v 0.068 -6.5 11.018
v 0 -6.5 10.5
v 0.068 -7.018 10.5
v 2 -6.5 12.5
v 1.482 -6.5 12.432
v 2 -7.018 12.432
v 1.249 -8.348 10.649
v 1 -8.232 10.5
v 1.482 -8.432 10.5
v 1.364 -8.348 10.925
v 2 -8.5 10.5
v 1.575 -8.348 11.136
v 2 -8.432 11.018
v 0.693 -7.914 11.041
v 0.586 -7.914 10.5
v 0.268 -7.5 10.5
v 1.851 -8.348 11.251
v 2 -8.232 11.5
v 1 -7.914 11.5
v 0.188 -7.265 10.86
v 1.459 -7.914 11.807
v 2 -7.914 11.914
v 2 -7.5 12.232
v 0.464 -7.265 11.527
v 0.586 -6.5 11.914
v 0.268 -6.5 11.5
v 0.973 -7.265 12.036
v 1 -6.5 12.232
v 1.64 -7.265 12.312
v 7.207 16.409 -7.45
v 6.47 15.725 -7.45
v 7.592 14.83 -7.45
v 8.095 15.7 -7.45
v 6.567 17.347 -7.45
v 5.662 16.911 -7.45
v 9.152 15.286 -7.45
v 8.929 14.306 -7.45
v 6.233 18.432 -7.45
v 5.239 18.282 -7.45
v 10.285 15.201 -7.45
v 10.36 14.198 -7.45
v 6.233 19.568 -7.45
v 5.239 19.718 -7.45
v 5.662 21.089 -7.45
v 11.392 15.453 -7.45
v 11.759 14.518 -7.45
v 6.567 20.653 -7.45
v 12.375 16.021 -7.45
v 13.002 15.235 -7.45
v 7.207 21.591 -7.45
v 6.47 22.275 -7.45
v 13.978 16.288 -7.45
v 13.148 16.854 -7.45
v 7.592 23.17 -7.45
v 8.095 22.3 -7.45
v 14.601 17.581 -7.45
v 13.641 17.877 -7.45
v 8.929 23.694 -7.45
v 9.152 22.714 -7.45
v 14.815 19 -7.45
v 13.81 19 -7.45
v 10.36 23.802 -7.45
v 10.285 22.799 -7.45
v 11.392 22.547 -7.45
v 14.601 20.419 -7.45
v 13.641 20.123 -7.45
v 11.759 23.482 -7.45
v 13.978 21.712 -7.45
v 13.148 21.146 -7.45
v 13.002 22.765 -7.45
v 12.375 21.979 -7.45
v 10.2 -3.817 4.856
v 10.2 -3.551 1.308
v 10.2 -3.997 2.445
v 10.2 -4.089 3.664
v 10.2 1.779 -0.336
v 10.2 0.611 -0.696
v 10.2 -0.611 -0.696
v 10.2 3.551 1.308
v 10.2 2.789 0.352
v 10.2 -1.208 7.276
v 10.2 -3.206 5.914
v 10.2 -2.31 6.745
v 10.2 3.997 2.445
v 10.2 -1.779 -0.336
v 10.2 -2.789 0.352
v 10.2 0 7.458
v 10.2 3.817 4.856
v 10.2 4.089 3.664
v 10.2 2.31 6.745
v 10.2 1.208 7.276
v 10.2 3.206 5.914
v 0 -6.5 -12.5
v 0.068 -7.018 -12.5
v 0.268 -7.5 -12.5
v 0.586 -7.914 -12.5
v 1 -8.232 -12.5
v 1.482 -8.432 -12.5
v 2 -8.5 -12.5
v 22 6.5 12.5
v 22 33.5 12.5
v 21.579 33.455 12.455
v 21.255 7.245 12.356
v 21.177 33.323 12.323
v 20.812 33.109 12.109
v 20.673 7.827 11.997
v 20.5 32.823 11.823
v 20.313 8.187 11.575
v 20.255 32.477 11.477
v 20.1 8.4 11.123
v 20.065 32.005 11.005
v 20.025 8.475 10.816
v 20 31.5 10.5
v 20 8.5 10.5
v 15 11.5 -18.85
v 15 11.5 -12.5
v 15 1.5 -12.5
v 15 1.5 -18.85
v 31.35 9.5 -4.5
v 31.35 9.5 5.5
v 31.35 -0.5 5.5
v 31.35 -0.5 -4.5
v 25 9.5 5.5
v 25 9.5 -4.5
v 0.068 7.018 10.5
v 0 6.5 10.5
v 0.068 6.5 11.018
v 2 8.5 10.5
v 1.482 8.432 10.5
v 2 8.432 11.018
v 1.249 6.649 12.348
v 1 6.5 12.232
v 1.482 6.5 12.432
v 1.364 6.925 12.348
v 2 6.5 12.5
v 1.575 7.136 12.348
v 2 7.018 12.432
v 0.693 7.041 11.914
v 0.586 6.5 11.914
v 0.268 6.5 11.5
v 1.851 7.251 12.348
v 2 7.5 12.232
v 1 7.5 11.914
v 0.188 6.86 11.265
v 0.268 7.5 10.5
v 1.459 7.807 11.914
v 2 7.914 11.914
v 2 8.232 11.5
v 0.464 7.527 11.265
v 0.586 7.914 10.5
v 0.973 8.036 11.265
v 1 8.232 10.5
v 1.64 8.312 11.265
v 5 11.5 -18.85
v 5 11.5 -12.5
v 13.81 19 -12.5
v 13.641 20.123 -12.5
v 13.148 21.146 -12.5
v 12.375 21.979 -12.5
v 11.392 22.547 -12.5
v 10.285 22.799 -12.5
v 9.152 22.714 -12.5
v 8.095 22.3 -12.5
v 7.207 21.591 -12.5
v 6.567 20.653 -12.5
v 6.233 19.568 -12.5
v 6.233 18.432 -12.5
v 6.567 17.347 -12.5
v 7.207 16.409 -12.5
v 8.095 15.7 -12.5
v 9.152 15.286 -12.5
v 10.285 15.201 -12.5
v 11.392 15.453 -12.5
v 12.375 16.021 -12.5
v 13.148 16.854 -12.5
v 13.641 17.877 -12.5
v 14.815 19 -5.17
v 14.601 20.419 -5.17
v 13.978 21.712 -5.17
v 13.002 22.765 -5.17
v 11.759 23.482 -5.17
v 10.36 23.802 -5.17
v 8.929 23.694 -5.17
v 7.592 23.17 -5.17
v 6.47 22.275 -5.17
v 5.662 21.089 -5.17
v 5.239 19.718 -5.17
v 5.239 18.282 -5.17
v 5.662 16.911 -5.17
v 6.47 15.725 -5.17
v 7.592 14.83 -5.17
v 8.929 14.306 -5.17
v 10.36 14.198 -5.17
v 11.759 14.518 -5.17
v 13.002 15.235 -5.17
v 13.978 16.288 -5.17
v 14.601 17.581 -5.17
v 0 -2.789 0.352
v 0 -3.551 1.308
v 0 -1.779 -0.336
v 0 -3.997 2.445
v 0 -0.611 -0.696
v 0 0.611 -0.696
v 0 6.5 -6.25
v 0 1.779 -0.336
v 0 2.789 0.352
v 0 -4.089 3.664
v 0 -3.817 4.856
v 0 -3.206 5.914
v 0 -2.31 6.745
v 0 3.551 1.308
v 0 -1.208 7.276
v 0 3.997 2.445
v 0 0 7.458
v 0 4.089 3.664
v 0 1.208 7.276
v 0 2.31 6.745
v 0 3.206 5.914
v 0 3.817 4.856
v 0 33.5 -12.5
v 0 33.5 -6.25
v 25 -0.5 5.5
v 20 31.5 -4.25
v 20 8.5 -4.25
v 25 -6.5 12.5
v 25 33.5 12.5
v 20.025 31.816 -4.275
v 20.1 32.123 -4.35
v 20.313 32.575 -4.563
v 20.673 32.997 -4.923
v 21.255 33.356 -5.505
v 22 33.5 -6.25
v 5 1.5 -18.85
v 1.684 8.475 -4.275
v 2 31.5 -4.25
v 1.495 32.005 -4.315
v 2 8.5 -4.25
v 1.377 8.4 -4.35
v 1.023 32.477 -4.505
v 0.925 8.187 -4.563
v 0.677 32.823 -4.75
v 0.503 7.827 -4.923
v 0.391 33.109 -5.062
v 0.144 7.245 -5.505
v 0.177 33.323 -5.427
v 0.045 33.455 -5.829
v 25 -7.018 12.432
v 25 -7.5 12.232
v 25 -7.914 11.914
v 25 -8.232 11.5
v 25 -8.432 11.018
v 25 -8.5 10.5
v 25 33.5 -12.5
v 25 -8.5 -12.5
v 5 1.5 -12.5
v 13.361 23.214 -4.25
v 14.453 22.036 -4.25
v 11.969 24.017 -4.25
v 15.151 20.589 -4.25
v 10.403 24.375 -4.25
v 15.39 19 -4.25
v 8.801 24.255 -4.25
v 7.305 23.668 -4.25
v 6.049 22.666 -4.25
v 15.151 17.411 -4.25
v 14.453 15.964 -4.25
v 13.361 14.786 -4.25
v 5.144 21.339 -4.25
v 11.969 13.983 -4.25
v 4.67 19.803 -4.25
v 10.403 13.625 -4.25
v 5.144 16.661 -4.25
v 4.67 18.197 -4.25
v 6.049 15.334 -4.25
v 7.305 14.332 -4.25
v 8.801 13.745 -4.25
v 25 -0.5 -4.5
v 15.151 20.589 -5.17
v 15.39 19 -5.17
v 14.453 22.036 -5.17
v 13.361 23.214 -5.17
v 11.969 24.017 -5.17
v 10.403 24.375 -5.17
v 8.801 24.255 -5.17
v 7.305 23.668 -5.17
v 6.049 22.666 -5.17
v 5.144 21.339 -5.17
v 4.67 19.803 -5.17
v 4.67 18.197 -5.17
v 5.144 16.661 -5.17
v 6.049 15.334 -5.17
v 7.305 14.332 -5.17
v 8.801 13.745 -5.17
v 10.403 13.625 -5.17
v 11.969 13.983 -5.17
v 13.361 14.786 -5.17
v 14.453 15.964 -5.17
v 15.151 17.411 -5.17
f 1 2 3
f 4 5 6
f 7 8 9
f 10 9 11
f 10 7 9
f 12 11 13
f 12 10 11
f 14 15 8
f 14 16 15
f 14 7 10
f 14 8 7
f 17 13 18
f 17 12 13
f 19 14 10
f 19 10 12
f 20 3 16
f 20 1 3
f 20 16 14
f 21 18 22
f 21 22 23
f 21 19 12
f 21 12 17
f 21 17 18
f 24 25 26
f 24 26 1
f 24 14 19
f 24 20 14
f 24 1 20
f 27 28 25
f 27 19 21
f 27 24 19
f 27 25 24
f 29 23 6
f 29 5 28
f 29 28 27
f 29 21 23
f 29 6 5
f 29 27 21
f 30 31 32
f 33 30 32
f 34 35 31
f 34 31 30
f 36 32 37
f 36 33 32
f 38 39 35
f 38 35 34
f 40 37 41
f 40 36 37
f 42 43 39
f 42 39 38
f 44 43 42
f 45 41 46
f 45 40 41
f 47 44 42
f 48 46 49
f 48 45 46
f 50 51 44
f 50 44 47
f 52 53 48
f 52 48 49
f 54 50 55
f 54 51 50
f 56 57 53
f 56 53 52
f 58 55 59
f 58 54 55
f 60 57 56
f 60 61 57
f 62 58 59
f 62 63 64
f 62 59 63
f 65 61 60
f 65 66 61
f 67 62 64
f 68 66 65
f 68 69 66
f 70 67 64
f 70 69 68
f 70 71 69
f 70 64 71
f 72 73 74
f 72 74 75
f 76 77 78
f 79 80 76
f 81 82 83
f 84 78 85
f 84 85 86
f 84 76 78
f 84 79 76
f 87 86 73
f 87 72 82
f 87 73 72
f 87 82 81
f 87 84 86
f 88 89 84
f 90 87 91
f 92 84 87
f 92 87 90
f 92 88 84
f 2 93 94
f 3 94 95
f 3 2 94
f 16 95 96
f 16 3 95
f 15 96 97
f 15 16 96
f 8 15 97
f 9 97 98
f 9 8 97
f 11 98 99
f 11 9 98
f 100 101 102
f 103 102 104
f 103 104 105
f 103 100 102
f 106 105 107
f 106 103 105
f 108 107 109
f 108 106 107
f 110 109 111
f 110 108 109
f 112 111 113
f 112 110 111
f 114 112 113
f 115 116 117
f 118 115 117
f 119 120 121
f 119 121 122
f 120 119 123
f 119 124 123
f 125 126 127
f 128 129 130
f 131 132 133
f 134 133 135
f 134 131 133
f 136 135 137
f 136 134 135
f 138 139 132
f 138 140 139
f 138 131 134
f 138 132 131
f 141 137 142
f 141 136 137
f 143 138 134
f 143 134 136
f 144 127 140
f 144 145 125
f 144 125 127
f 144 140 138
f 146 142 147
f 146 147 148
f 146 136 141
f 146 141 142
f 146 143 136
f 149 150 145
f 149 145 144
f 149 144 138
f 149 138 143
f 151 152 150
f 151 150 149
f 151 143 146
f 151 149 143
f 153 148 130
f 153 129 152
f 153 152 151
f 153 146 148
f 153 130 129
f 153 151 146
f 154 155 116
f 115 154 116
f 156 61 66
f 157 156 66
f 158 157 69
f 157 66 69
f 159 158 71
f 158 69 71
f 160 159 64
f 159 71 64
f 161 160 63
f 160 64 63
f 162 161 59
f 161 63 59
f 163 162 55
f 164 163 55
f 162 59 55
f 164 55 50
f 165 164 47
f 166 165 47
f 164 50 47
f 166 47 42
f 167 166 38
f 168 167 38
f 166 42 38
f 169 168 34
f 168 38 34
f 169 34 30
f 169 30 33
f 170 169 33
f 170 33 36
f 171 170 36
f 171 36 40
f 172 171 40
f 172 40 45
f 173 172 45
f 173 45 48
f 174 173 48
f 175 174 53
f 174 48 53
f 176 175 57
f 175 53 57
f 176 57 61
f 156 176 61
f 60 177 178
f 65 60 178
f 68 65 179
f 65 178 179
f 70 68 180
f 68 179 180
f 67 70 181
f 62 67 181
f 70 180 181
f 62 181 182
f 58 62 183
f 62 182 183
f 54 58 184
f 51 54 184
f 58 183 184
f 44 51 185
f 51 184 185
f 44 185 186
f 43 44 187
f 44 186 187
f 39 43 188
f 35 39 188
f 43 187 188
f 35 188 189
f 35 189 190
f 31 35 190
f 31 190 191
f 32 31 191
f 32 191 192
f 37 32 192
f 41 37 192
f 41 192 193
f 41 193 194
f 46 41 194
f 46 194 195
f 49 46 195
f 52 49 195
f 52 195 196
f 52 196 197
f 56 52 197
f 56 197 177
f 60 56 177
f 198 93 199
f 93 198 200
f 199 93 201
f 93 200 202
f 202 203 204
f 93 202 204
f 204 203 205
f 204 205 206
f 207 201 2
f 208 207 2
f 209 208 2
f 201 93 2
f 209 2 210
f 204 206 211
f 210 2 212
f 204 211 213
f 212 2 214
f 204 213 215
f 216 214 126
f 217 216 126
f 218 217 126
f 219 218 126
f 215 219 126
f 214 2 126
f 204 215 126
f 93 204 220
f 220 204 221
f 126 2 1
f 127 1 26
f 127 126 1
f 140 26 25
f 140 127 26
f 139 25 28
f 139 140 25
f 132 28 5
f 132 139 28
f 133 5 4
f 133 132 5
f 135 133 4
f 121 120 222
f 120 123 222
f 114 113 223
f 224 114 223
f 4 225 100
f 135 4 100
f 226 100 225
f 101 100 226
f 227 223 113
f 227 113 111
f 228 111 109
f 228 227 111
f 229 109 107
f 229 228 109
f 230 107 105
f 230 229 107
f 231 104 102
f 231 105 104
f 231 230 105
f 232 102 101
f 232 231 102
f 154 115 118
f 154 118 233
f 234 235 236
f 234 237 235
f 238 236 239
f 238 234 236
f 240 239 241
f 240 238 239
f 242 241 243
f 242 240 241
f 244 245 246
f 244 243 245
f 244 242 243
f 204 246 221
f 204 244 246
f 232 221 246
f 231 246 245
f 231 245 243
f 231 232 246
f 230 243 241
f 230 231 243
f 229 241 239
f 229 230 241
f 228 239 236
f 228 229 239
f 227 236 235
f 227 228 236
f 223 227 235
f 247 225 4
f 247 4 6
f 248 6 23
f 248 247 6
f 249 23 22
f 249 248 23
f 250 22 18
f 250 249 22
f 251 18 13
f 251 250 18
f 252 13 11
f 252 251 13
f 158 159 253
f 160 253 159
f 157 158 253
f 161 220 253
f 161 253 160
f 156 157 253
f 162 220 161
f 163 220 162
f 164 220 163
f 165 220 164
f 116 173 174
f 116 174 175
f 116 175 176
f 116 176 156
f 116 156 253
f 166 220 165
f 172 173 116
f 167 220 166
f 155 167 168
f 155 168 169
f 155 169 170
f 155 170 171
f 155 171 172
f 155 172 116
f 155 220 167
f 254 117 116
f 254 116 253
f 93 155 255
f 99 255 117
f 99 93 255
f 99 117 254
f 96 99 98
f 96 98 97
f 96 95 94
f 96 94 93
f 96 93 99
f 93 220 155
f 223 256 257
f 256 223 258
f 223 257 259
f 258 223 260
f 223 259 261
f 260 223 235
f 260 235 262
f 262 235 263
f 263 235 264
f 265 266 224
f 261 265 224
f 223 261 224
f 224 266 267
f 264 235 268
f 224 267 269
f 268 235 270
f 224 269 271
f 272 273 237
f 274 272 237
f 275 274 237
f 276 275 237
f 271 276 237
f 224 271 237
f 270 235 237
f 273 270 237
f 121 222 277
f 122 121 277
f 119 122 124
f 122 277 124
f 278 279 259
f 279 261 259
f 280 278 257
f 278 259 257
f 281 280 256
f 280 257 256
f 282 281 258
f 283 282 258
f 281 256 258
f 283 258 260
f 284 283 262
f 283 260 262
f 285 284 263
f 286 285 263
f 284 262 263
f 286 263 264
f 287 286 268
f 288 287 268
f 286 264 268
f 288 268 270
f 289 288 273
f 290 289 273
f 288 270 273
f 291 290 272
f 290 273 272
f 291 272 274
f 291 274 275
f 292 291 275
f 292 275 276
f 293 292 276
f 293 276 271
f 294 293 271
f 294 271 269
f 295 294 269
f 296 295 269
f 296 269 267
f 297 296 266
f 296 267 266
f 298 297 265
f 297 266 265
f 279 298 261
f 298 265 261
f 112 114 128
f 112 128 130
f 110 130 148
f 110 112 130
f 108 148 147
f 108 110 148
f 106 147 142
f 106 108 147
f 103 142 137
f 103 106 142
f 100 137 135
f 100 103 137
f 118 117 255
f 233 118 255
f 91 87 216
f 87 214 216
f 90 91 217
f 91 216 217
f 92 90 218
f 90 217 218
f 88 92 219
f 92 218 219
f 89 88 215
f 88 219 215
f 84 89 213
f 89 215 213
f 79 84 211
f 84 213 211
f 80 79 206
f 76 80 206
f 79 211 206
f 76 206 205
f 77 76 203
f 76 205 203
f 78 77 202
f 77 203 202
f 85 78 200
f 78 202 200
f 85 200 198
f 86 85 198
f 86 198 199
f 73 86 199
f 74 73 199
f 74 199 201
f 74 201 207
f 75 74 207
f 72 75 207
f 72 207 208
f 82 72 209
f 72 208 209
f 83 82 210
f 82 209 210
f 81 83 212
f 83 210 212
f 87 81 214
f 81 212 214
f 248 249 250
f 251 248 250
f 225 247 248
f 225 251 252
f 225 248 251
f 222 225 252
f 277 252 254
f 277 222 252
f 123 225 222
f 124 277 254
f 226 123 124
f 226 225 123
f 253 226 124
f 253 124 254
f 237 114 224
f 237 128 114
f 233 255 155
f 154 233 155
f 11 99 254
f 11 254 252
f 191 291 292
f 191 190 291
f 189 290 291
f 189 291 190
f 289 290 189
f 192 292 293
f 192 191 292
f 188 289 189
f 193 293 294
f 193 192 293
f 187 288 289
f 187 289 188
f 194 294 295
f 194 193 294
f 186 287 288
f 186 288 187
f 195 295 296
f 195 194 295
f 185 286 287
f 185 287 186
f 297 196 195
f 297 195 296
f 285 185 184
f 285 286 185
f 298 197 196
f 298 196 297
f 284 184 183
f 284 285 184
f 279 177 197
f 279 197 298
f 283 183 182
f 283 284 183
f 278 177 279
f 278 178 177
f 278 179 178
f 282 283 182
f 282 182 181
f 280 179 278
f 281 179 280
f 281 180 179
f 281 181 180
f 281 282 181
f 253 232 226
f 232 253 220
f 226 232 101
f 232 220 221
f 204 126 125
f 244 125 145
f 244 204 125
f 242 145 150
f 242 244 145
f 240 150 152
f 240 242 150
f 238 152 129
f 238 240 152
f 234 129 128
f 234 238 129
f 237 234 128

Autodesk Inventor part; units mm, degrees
ref_plane "YZ Plane" through (0, 0, 0) normal (1, 0, 0) x (0, 1, 0)
ref_plane "XZ Plane" through (0, 0, 0) normal (0, 1, 0) x (-1, 0, 0)
ref_plane "XY Plane" through (0, 0, 0) normal (0, 0, 1) x (1, 0, 0)
sketch "Sketch1" plane through (0, 0, 0) normal (1, 0, 0) x (0, 1, 0)
  line L0 (-8.5, 12.5) -> (8.5, 12.5)
  line L1 (8.5, 12.5) -> (8.5, -12.5)
  line L2 (8.5, -12.5) -> (-8.5, -12.5)
  line L3 (-8.5, -12.5) -> (-8.5, 12.5)
  line L4 (-8.5, 12.5) -> (8.5, -12.5) construction
  line L5 (8.5, 12.5) -> (-8.5, -12.5) construction
  line L6 (8.5, -12.5) -> (33.5, -12.5)
  line L7 (8.5, -12.5) -> (33.5, -12.5) construction
  line L8 (33.5, -12.5) -> (33.5, -4.25)
  line L9 (33.5, -4.25) -> (8.5, -4.25)
  line L10 (33.5, -4.25) -> (58.5, -4.25) construction
  point P0 (0, 0)
  dimension "d0" = 17
  dimension "d1" = 25
  dimension "d2" = 25
  dimension "d3" = 0
  dimension "d4" = 8.25
  dimension "d5" = 90
  dimension "d6" = 180
extrude "Extrusion1" add sketch "Sketch1" along normal blind 20
sketch "Sketch2" plane through (0, 8.5, -4.25) normal (0, 0, 1) x (1, 0, 0)
  circle A0 centre (10, 10.5) radius 3.81
  line L0 (0, 25) -> (20, 25) projected
  line L1 (0, -8.5) -> (20, -8.5) construction
  line L2 (20, -17) -> (20, 25) projected
  dimension "d9" = 7.62
  dimension "d32" = 19
extrude "Extrusion2" cut sketch "Sketch2" against normal through all
sketch "Sketch3" plane through (0, 8.5, -4.25) normal (0, 0, 1) x (1, 0, 0)
  circle A0 centre (10, 10.5) radius 3.81 projected
  circle A1 centre (10, 10.5) radius 4.815
  point P0 (0, -8.5)
  dimension "d13" = 9.63
extrude "Extrusion3" cut sketch "Sketch3" against normal blind 3.2
sketch "Sketch4" plane through (0, 8.5, -4.25) normal (0, 0, 1) x (1, 0, 0)
  circle A0 centre (10, 10.5) radius 3.81 projected
  circle A1 centre (10, 10.5) radius 5.39
  point P0 (0, -8.5)
  dimension "d16" = 10.78
extrude "Extrusion4" cut sketch "Sketch4" against normal blind 0.92
sketch "Sketch6" plane through (0, -8.5, -12.5) normal (0, -1, 0) x (1, 0, 0)
  circle A0 centre (10, 12) radius 6.2485
  line L0 (0, 0) -> (20, 0) projected
  line L1 (0, 25) -> (0, 0) projected
  point P0 (0, 12.5)
  dimension "d22" = 12.497
  dimension "d25" = 12
  dimension "d26" = 10
extrude "Extrusion6" [suppressed]
sketch "Sketch9" plane through (0, -8.5, -12.5) normal (0, 0, -1) x (-1, 0, 0)
  line L0 (-5, 20) -> (-15, 20)
  line L1 (-15, 20) -> (-15, 10)
  line L2 (-15, 10) -> (-5, 10)
  line L3 (-5, 10) -> (-5, 20)
  line L4 (0, 0) -> (0, 42) projected
  line L5 (0, 0) -> (-20, 0) projected
  point P0 (0, 8.5)
  dimension "d38" = 10
  dimension "d39" = 10
  dimension "d40" = 5
  dimension "d41" = 10
extrude "Extrusion8" add sketch "Sketch9" along normal blind 6.35
sketch "Sketch12" plane through (20, 0, 0) normal (1, 0, 0) x (0, 0, -1)
  line L0 (12.5, -8.5) -> (12.5, 33.5) projected
  line L1 (12.5, 33.5) -> (4.25, 33.5) projected
  line L2 (4.25, 33.5) -> (4.25, 8.5) projected
  line L3 (4.25, 8.5) -> (-12.5, 8.5) projected
  line L4 (-12.5, 8.5) -> (-12.5, -8.5) projected
  line L5 (-12.5, -8.5) -> (12.5, -8.5) projected
  line L6 (-12.5, -8.5) -> (12.5, -8.5) projected
  line L7 (12.5, -8.5) -> (-12.5, -8.5)
  line L8 (-12.5, -8.5) -> (-12.5, 33.5)
  line L9 (-12.5, 33.5) -> (12.5, 33.5)
  line L10 (12.5, 33.5) -> (12.5, -8.5)
  line L11 (12.5, 33.5) -> (4.25, 33.5) projected
  line L12 (-12.5, 8.5) -> (-12.5, -8.5) projected
  point P0 (0, 0)
extrude "Extrusion10" add sketch "Sketch12" along normal blind 5
sketch "Sketch14" plane through (0, 0, 0) normal (-1, 0, 0) x (0, 0, 1)
  circle A0 centre (3.3578, 0) radius 4.1
  line L0 (-12.5, -8.5) -> (-12.5, 33.5) projected
  line L1 (12.5, -8.5) -> (-12.5, -8.5) projected
  line L2 (12.5, 8.5) -> (12.5, -8.5) projected
  line L3 (-4.25, 8.5) -> (12.5, 8.5) projected
  line L4 (-4.25, 33.5) -> (-4.25, 8.5) projected
  line L5 (-12.5, 33.5) -> (-4.25, 33.5) projected
  point P0 (0, 0)
  dimension "d52" = 8.5
  dimension "d53" = 8.2
extrude "Extrusion11" cut sketch "Sketch14" against normal blind 10.2 contours A0
sketch "Sketch15" plane through (25, 0, 0) normal (1, 0, 0) x (0, 0, -1)
  line L0 (12.5, -8.5) -> (12.5, 33.5) projected
  line L1 (12.5, 33.5) -> (-12.5, 33.5) projected
  line L2 (-12.5, 33.5) -> (-12.5, -8.5) projected
  line L3 (-12.5, -8.5) -> (12.5, -8.5) projected
  circle A0 centre (-3.3578, 0) radius 4.1 projected
  circle A1 centre (-3.3578, 0) radius 4.1 projected
  line L4 (-5.5, -0.5) -> (4.5, -0.5)
  line L5 (4.5, -0.5) -> (4.5, 9.5)
  line L6 (4.5, 9.5) -> (-5.5, 9.5)
  line L7 (-5.5, 9.5) -> (-5.5, -0.5)
  line L8 (-5.5, -0.5) -> (4.5, 9.5) construction
  line L9 (4.5, -0.5) -> (-5.5, 9.5) construction
  point P0 (0, 0)
  point P1 (-0.5, 4.5)
  dimension "d56" = 10
  dimension "d57" = 10
  dimension "d58" = 8
  dimension "d59" = 8
extrude "Extrusion12" add sketch "Sketch15" along normal blind 6.35 contours A0 L4 L7 | A0 L7 L6 L5 L4 picked at (-1.3763, 0.1524)
fillet "Fillet3" radius 2 9 edges at (0, 21, -4.25) (0, 8.5, 4.125) (10, 8.5, 12.5) (0, 0, 12.5) (20, 21, 12.5) (20, 33.5, 4.125) (10, 33.5, -4.25) (12.5, -8.5, 12.5) (0, -8.5, 0)
sketch "Sketch10" plane through (0, 0, 0) normal (-1, 0, 0) x (0, 0, 1)
  line L0 (-12.5, -8.5) -> (-12.5, 33.5) projected
  line L1 (12.5, -8.5) -> (-12.5, -8.5) projected
  line L2 (12.5, 8.5) -> (12.5, -8.5) projected
  line L3 (-4.25, 8.5) -> (12.5, 8.5) projected
  line L4 (-4.25, 33.5) -> (-4.25, 8.5) projected
  line L5 (-12.5, 33.5) -> (-4.25, 33.5) projected
  line L6 (2.5, 6.5) -> (-7.5, 6.5)
  line L7 (-7.5, 6.5) -> (-7.5, -3.5)
  line L8 (-7.5, -3.5) -> (2.5, -3.5)
  line L9 (2.5, -3.5) -> (2.5, 6.5)
  point P0 (0, 0)
  dimension "d44" = 10
  dimension "d45" = 10
  dimension "d46" = 5
  dimension "d47" = 5
sketch "Sketch8" plane through (20, 0, 0) normal (1, 0, 0) x (0, 0, -1)
  circle A0 centre (-2, 0) radius 4.05
  line L0 (4.25, 13.61) -> (4.25, 24.39) projected
  line L1 (4.25, 10.5) -> (4.25, 31.5) projected
  line L2 (4.25, 31.5) -> (4.25, 10.5) projected
  line L3 (7.45, 22.81) -> (7.45, 15.19) projected
  line L4 (12.5, 22.81) -> (12.5, 15.19) projected
  line L5 (7.45, 22.81) -> (7.45, 15.19) projected
  point P0 (0, 0)
  dimension "d34" = 8.1
  dimension "d35" = 6.25
sketch "Sketch5" plane through (20, 0, 0) normal (1, 0, 0) x (0, 0, -1)
  circle A0 centre (0, 0) radius 4.05
  line L0 (27.5, -8.5) -> (27.5, 33.5) projected
  line L1 (27.5, 33.5) -> (19.5, 33.5) projected
  line L2 (19.5, 33.5) -> (19.5, 8.5) projected
  line L3 (19.5, 8.5) -> (-27.5, 8.5) projected
  line L4 (-27.5, 8.5) -> (-27.5, -8.5) projected
  line L5 (-27.5, -8.5) -> (27.5, -8.5) projected
  dimension "d19" = 8.1
  dimension "d33" = 27.5
properties part number "frame-holder-v3"
